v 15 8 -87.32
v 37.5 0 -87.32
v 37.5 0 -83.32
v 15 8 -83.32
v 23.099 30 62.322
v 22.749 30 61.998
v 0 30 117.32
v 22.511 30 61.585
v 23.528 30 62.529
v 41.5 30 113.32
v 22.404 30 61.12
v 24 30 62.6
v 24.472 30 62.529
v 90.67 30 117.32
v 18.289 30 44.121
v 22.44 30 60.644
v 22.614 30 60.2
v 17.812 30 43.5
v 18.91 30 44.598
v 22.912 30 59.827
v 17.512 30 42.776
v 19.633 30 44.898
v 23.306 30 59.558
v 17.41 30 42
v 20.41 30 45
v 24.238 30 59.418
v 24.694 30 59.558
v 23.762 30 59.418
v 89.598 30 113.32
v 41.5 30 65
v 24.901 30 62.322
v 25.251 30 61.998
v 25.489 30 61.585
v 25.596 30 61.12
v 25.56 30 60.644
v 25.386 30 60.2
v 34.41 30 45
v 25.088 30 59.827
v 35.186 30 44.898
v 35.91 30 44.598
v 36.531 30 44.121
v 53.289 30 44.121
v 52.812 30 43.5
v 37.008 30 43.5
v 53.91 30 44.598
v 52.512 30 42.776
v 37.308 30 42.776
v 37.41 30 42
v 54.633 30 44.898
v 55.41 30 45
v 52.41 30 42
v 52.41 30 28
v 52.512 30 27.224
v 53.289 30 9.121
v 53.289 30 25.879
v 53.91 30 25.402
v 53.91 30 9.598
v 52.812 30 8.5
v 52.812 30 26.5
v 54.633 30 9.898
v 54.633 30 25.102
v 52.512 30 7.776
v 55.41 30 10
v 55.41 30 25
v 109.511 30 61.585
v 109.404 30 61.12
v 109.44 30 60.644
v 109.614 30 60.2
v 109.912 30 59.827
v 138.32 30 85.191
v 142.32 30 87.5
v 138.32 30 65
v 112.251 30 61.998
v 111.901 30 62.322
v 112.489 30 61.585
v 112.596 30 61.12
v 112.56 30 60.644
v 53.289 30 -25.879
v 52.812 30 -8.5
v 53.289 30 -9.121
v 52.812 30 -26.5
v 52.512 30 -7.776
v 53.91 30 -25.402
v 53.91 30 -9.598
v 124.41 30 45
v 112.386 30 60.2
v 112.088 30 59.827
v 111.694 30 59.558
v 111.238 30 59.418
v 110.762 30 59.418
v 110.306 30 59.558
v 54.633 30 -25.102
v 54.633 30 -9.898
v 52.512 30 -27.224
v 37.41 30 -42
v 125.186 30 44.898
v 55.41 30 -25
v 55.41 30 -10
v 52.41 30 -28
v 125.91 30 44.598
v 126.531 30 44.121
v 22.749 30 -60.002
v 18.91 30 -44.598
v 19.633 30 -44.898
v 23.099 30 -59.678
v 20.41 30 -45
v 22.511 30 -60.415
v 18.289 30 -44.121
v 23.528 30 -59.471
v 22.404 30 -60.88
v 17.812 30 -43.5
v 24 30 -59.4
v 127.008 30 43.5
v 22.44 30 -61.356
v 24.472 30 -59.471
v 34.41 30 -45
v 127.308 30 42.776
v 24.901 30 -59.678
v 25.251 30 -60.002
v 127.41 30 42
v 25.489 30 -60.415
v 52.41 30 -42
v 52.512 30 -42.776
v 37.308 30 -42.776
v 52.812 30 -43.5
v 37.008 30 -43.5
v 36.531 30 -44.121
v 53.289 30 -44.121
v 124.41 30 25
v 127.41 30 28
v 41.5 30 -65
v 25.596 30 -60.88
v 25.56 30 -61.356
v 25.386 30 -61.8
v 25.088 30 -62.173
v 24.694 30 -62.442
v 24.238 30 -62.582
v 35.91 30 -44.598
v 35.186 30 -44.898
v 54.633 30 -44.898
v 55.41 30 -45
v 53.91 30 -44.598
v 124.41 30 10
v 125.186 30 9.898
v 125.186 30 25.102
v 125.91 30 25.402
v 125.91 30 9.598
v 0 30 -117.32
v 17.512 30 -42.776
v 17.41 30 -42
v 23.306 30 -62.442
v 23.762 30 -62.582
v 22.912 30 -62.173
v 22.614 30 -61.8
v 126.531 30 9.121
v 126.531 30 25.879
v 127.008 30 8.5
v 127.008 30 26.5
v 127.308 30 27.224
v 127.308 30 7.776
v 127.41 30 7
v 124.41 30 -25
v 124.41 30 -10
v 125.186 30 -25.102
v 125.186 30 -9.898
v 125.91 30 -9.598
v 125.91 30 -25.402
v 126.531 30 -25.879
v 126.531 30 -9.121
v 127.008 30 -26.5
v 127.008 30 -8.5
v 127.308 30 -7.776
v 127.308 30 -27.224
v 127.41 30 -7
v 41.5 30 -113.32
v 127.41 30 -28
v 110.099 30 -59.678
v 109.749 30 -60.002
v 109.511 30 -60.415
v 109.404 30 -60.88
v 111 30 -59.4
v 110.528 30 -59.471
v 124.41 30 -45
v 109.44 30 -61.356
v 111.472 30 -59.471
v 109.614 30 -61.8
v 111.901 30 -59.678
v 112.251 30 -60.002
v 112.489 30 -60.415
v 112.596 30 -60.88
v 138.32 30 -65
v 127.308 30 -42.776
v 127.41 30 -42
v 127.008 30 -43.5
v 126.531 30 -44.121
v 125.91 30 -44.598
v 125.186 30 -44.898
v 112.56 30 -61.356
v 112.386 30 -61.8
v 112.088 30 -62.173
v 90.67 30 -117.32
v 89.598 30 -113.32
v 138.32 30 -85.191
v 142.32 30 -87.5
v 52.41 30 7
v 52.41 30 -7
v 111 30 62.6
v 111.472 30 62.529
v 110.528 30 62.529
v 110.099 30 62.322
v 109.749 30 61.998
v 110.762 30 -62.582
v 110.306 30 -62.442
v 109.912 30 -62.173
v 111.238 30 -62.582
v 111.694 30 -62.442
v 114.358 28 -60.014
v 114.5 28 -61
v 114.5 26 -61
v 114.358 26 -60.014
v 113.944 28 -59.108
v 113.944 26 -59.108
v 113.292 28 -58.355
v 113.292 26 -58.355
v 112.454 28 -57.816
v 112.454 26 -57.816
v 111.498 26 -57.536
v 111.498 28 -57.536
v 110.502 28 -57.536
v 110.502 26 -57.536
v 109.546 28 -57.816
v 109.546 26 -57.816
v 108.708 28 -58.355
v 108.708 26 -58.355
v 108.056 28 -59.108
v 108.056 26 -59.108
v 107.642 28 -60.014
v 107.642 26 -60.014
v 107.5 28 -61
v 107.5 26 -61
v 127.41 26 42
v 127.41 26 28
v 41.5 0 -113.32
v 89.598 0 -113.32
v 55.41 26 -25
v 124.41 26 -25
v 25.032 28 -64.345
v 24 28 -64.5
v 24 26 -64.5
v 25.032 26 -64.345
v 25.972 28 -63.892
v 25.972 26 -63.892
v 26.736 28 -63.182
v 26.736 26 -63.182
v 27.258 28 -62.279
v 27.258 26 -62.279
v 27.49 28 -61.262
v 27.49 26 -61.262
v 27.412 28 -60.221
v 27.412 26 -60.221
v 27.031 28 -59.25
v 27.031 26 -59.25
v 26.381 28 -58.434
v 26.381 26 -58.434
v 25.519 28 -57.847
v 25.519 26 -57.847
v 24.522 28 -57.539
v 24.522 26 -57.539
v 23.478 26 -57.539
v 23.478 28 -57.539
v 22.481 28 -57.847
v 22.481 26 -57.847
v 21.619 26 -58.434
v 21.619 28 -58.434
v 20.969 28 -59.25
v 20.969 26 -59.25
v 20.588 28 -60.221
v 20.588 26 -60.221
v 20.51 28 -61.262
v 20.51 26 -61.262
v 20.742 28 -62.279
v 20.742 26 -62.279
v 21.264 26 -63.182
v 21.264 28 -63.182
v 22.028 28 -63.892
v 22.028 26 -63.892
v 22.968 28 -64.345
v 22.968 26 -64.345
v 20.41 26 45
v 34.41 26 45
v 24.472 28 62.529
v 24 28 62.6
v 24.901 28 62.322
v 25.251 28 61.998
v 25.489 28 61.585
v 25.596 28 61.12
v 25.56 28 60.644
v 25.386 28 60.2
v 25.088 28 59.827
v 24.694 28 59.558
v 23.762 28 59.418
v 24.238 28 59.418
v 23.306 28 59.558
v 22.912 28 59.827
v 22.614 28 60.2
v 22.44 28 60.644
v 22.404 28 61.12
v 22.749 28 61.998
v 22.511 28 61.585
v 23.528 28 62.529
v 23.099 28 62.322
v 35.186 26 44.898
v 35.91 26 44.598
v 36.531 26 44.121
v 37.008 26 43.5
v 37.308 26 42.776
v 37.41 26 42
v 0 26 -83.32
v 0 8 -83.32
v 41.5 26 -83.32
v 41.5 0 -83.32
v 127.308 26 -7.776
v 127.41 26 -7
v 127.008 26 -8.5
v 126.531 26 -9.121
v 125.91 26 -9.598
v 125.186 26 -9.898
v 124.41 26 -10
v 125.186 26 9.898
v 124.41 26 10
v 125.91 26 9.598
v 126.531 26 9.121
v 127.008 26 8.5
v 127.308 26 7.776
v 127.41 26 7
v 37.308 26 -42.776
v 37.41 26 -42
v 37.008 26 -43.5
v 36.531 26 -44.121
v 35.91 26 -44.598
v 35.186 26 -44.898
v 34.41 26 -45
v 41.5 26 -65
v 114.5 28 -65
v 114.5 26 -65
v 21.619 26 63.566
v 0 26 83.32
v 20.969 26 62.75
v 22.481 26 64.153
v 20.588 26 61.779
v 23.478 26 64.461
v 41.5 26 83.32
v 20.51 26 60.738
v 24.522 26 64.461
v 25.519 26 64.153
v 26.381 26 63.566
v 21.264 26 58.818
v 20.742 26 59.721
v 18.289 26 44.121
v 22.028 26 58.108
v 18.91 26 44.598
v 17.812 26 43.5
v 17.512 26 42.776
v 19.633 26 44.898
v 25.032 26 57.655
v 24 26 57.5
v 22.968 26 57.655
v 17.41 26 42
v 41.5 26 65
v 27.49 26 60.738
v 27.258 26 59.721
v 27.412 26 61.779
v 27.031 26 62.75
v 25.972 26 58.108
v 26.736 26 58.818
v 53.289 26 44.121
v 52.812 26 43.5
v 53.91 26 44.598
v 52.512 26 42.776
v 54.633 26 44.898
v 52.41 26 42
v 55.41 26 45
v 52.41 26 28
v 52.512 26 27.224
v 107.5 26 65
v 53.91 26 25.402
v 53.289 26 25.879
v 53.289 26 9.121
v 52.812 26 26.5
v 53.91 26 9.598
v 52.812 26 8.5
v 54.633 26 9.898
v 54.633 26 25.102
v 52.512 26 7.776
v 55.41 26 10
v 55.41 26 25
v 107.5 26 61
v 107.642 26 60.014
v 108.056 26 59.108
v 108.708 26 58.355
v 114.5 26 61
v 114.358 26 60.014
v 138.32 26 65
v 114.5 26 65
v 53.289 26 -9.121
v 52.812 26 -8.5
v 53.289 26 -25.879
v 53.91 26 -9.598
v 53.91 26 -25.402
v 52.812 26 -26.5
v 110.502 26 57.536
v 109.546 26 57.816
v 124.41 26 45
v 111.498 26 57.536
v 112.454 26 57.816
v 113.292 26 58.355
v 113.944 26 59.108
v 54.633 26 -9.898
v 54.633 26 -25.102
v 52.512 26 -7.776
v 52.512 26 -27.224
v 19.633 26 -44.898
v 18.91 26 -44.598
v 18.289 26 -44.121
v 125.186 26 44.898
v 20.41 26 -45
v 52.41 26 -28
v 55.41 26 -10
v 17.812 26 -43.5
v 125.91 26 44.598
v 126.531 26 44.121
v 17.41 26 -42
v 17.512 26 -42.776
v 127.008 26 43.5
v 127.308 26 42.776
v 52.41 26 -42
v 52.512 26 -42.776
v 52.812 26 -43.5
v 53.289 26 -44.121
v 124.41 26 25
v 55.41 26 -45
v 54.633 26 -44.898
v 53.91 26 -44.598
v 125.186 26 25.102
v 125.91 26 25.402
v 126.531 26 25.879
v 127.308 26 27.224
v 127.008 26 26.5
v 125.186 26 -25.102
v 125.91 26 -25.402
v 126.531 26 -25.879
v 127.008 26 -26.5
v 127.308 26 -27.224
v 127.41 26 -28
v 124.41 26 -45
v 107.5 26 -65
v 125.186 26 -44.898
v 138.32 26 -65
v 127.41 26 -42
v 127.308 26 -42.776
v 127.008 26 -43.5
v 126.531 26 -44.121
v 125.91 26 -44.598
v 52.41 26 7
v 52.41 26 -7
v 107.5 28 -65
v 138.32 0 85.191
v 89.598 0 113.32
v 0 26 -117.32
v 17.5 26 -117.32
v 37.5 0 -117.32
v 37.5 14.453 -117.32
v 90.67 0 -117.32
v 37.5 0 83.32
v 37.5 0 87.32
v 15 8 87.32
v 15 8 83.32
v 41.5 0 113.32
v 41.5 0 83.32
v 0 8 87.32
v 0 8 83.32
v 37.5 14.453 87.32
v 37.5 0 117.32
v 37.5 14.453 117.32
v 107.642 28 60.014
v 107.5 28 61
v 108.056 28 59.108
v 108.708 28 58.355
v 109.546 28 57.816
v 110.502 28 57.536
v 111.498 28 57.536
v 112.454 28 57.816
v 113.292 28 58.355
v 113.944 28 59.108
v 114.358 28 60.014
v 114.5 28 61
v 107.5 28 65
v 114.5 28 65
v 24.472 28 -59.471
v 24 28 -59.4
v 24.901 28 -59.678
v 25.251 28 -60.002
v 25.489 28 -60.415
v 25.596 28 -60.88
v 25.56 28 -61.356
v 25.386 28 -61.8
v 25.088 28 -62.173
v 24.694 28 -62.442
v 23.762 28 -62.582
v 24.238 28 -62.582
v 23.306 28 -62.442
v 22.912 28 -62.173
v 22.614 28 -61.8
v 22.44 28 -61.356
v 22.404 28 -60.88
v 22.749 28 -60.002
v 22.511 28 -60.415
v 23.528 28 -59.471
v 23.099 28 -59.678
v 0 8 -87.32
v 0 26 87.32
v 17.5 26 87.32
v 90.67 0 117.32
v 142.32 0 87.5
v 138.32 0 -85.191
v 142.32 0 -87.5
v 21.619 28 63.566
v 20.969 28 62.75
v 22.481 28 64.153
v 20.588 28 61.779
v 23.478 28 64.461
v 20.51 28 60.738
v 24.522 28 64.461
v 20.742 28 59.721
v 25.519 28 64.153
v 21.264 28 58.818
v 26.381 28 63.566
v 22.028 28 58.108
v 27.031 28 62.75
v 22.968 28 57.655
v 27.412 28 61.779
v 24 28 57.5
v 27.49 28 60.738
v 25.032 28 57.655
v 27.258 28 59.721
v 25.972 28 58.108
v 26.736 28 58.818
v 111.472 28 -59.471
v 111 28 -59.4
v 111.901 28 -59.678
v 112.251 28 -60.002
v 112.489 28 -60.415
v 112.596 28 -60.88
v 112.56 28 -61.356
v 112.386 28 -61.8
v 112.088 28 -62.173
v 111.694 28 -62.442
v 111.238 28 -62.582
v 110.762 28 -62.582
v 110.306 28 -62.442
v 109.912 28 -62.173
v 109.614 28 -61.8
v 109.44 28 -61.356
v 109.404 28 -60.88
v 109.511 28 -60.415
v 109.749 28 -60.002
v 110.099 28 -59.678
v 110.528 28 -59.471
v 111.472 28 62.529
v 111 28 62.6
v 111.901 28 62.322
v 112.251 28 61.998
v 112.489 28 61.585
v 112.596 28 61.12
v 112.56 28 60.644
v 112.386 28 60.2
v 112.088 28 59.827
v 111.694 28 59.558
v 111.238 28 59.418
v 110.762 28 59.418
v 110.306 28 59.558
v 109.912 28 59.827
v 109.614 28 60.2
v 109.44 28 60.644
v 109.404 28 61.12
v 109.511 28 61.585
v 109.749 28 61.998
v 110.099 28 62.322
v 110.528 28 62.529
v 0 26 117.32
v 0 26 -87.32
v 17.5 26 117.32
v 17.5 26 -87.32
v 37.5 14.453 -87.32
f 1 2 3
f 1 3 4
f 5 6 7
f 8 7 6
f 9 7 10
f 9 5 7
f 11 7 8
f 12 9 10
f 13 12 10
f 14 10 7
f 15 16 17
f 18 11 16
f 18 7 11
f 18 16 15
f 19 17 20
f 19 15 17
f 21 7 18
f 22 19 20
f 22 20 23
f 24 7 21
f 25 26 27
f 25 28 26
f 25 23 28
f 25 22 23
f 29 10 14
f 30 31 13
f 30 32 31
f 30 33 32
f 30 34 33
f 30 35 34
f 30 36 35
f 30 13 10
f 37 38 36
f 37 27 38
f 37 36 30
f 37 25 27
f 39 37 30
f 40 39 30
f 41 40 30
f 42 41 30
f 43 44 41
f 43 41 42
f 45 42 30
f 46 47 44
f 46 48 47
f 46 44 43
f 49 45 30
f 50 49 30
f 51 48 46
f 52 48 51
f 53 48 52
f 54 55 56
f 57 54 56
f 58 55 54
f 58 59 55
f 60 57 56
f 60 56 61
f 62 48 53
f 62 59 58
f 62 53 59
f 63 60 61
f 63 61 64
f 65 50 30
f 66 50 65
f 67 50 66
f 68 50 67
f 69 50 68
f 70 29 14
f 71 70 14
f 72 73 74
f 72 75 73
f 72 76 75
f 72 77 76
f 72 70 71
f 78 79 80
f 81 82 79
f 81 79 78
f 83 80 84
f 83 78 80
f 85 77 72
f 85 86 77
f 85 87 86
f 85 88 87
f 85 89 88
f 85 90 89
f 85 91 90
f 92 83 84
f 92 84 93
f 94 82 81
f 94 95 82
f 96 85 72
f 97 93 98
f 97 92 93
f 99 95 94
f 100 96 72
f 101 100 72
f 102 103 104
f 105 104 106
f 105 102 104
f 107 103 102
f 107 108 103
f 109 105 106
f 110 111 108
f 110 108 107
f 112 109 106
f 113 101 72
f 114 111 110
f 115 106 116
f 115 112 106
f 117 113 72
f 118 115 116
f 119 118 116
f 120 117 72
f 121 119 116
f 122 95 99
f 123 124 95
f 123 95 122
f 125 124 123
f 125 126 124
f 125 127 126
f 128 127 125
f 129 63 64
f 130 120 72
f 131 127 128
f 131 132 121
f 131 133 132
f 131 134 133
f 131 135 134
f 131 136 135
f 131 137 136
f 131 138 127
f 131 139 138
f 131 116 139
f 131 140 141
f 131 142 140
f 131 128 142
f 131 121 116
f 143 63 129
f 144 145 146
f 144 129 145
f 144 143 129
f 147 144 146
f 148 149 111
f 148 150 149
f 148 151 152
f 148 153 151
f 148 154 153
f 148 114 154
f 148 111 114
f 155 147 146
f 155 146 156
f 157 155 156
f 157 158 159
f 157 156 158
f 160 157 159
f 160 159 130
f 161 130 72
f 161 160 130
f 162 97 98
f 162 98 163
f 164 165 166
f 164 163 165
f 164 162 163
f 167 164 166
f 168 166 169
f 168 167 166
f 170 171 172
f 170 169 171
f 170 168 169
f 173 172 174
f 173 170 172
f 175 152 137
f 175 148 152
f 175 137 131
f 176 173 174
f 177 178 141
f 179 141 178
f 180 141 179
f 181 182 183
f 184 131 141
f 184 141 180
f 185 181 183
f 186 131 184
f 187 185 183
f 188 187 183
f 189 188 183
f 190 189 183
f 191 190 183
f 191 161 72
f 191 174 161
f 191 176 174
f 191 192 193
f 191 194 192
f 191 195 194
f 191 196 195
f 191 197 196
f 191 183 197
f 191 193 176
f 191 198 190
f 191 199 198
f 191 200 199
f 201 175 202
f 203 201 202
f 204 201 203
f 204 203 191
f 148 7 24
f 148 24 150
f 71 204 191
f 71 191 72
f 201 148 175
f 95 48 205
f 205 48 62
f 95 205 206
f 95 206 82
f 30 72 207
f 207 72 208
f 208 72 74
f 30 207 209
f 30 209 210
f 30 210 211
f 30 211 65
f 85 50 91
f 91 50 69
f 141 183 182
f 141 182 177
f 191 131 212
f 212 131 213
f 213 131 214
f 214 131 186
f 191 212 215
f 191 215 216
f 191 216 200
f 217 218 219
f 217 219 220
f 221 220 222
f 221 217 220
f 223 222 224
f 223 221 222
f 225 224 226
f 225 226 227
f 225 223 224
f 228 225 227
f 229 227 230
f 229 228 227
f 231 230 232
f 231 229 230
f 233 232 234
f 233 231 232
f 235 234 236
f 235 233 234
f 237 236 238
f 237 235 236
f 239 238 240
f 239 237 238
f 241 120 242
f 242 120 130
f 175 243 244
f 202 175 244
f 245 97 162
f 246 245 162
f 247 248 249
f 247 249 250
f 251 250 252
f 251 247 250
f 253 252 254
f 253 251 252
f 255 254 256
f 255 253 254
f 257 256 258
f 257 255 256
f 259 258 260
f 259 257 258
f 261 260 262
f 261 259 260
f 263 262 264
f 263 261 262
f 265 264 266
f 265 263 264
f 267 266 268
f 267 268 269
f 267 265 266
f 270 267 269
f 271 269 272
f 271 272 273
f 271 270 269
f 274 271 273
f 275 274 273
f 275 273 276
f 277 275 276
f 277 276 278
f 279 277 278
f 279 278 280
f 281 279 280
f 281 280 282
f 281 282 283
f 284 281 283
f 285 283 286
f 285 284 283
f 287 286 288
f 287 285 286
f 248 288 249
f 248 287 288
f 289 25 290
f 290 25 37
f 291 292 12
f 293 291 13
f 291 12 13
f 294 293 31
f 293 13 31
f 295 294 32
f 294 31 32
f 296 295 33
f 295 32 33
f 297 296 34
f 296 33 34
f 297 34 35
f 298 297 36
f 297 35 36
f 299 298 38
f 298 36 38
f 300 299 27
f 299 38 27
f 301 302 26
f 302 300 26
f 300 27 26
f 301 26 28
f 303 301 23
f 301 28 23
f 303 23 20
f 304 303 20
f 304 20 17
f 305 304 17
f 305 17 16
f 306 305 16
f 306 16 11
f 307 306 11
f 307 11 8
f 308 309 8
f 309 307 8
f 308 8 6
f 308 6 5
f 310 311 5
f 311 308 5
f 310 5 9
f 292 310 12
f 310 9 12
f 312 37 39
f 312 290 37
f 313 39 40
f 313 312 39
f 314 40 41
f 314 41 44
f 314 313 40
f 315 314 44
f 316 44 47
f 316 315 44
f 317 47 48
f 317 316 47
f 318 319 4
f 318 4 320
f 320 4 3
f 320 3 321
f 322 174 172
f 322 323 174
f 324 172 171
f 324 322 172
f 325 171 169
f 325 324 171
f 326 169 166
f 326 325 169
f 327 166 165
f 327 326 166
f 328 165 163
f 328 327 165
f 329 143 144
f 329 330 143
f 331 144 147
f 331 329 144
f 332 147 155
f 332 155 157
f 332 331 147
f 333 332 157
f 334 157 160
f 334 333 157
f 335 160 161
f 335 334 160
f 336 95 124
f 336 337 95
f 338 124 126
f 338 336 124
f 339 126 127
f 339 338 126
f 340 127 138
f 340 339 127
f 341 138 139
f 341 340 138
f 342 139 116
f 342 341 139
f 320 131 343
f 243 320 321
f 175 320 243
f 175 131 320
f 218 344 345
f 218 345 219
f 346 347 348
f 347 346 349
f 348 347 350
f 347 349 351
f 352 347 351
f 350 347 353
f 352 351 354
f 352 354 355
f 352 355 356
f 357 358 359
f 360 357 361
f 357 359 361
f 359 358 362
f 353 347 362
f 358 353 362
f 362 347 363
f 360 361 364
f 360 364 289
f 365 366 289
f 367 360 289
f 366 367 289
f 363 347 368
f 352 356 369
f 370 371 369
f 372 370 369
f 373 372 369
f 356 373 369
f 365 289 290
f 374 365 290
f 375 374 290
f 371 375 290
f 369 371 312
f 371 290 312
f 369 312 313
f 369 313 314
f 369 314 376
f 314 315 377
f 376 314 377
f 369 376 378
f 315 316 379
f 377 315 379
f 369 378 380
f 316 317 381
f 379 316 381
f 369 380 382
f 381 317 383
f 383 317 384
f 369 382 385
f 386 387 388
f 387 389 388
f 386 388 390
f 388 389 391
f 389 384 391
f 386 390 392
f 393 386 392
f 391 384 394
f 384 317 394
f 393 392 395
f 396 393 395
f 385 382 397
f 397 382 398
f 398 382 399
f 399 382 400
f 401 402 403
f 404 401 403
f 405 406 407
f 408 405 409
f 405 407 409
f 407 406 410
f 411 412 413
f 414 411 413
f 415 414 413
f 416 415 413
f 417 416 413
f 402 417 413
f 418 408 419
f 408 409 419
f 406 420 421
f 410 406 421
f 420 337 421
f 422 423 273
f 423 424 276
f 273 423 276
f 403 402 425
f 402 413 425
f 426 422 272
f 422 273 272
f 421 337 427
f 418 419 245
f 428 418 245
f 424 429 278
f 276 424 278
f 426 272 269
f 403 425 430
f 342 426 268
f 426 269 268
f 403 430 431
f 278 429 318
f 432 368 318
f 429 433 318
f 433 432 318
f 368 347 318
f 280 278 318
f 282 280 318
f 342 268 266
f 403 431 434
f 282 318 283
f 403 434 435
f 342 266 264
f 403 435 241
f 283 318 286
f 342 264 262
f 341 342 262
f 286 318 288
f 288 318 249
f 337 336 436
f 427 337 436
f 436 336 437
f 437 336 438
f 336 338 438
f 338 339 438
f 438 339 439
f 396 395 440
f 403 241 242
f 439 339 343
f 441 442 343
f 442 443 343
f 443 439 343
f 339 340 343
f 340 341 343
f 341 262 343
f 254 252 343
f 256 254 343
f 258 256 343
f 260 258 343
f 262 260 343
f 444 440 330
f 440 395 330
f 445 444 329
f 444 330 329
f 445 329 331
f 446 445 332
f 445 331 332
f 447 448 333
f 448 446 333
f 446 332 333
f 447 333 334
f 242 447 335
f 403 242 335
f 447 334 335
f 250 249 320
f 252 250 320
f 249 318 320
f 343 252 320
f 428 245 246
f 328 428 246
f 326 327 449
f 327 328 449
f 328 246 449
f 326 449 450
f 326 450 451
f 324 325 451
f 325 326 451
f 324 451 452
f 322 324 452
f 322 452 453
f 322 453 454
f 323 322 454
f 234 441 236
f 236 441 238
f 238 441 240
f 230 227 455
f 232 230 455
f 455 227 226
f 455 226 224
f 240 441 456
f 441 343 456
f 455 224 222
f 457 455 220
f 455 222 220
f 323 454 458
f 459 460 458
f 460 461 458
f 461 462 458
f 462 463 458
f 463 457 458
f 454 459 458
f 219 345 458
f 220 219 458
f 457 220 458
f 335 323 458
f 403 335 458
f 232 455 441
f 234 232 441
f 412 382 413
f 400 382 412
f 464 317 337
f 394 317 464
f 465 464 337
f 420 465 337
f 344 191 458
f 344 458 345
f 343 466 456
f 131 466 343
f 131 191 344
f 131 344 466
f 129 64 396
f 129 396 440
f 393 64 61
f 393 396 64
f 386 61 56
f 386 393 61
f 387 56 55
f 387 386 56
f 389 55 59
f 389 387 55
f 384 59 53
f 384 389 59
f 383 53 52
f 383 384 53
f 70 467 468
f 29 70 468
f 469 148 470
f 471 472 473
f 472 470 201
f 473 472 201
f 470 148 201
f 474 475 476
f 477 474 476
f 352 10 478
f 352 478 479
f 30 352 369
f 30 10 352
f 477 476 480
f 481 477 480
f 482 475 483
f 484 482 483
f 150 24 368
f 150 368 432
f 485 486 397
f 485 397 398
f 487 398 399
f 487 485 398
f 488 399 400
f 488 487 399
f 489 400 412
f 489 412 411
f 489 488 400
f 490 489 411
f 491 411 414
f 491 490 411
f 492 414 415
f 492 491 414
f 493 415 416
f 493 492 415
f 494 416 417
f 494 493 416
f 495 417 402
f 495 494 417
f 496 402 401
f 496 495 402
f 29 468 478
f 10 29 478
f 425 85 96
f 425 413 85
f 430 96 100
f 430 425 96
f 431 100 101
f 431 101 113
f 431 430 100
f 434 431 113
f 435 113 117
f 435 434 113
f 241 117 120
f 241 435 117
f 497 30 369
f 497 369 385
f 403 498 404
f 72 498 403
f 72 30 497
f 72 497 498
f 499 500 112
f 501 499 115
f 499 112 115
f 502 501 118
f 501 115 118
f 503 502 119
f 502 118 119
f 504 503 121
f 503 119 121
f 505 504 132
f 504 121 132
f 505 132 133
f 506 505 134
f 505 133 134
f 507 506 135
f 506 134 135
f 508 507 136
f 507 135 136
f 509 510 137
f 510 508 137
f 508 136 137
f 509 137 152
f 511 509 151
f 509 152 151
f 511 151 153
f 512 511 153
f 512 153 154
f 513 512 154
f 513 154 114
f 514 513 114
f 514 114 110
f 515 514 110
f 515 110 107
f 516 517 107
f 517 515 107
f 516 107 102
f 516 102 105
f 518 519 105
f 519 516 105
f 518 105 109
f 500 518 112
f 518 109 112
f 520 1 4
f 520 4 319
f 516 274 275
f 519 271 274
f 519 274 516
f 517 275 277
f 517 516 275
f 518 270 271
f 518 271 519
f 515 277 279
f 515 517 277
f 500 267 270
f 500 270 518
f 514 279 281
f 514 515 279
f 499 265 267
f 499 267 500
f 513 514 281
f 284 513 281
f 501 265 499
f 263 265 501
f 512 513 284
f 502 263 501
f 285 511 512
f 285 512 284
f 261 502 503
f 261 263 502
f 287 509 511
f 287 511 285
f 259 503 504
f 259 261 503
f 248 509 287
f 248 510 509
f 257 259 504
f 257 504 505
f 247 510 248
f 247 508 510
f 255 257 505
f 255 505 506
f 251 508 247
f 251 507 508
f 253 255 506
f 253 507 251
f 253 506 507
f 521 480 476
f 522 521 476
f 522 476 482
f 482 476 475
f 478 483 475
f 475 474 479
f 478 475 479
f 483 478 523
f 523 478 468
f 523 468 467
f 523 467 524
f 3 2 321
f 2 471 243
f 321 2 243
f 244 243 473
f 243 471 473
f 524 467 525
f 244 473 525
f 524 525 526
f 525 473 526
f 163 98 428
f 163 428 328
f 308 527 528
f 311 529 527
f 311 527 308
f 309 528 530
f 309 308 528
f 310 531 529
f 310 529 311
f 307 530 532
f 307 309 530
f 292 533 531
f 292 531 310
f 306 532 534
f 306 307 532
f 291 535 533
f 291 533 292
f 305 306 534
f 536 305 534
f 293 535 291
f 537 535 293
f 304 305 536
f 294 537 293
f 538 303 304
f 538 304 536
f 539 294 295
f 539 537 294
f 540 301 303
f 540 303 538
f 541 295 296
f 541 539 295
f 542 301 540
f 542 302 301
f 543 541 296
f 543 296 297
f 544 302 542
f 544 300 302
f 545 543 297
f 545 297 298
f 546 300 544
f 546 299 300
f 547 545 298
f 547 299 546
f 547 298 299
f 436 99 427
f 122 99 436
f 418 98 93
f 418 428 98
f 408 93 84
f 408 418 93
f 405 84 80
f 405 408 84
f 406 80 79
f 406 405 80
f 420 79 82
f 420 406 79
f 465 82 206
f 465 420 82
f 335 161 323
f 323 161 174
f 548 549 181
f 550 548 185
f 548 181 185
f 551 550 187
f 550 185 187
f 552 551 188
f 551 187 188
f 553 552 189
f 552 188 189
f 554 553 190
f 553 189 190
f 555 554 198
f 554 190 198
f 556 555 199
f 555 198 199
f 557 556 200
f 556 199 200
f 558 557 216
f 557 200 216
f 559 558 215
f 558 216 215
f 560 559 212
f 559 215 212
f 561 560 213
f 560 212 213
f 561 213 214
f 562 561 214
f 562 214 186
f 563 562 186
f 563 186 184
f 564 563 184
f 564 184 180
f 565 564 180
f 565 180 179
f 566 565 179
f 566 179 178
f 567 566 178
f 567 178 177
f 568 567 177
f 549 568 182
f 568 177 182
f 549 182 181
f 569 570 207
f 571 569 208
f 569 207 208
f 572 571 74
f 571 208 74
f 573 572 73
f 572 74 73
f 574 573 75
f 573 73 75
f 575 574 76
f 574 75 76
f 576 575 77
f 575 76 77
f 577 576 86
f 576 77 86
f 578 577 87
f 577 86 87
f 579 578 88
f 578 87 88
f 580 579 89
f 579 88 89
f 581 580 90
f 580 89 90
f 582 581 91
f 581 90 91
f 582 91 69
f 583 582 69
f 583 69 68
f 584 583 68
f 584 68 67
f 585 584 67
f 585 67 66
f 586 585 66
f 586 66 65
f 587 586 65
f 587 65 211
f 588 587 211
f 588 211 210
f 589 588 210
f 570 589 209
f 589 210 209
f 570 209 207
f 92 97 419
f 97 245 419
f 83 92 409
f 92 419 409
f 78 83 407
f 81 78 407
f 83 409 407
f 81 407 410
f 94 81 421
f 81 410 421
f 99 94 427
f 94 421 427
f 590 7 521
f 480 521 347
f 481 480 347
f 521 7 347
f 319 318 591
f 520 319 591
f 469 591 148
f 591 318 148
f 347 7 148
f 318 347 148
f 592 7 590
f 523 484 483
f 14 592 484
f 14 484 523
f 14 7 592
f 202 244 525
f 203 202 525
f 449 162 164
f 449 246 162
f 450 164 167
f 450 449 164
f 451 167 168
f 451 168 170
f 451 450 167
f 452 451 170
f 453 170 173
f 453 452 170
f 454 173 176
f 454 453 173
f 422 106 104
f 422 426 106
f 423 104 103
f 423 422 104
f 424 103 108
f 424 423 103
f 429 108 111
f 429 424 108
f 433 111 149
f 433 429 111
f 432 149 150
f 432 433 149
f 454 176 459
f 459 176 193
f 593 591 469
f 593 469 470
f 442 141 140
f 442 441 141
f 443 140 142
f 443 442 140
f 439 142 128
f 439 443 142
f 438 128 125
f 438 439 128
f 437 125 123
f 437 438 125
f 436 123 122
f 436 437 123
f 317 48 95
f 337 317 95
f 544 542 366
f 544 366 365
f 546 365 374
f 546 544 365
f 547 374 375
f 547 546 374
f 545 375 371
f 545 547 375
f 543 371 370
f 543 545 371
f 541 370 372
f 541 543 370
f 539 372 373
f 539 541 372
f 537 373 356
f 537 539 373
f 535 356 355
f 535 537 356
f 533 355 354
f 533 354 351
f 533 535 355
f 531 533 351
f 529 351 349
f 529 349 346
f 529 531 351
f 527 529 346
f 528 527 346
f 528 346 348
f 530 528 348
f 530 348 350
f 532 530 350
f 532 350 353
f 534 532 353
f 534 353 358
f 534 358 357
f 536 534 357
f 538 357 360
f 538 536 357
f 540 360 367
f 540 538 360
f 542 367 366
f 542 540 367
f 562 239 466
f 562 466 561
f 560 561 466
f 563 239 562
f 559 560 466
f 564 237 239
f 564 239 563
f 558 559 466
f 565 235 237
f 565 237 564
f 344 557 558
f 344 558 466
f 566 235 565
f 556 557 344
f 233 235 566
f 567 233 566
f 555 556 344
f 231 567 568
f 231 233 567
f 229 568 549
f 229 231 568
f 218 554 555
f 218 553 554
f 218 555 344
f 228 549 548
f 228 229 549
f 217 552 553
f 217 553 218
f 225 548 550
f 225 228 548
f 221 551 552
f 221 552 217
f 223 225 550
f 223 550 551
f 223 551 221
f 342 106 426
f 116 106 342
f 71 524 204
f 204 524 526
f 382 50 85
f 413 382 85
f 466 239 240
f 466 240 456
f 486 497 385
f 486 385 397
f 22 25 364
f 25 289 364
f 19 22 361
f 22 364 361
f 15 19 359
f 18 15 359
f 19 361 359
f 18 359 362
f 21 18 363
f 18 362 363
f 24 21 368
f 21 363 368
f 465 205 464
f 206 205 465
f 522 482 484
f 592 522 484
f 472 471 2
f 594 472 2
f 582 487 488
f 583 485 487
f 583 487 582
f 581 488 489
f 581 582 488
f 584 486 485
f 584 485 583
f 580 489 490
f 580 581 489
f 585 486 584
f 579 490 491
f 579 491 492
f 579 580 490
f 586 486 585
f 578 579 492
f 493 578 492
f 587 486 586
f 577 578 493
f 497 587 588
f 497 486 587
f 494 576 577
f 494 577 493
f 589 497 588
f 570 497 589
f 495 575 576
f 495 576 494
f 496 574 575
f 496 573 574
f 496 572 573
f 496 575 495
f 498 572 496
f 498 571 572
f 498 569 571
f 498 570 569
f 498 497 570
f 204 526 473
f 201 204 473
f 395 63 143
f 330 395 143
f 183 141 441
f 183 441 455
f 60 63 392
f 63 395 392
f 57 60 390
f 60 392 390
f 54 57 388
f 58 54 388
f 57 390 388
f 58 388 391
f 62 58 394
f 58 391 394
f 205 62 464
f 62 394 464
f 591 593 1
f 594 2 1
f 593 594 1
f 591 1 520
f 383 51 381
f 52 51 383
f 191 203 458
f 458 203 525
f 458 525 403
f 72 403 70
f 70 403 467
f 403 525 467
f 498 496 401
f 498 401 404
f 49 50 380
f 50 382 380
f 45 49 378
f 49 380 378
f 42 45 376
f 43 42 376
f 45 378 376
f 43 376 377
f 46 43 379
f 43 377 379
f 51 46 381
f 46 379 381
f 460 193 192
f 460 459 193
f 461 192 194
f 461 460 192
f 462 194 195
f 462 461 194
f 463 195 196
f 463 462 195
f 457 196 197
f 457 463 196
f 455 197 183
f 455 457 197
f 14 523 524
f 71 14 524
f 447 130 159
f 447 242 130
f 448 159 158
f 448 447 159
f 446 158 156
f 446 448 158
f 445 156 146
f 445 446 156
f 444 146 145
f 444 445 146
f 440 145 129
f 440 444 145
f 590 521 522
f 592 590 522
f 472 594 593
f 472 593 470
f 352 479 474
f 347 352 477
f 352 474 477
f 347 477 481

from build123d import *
from OCP.BRepFilletAPI import BRepFilletAPI_MakeChamfer

# Parameters (mm, degrees)
BOSS_EXTRUDE1_DEPTH = 30
CUT_EXTRUDE1_REACH  = 253.063
SKETCH10_W          = 41.5
SKETCH10_H          = 34
BOSS_EXTRUDE3_DEPTH = 4
CHAMFER4_SIZE       = 20
CHAMFER4_SIZE2      = 11.547005384
SKETCH11_W          = 20.75
SKETCH11_H          = 166.64
BOSS_EXTRUDE4_DEPTH = 4
SKETCH12_W          = 20.75
SKETCH12_H          = 18.32
BOSS_EXTRUDE5_DEPTH = 4
SKETCH13_W          = 75
SKETCH13_H          = 20
SKETCH13_W_2        = 20
SKETCH13_H_2        = 90
CUT_EXTRUDE2_DEPTH  = 4
FILLET1_R           = 3
CUT_EXTRUDE3_REACH  = 188.866
SKETCH15_R          = 1.6
CUT_EXTRUDE4_START  = -2
SKETCH16_R          = 3.5
SKETCH16_R_2        = 1.6
CUT_EXTRUDE4_DEPTH  = 2


with BuildPart() as part:
    # Sketch6 → Boss-Extrude1 (new body)
    with BuildSketch(Plane(origin=(0, 0, 0), x_dir=(1, 0, 0), z_dir=(0, 1, 0))):
        Polygon((0, -87.32), (37.5, -87.32), (37.5, -117.32), (90.67, -117.32), (142.319755082, -87.5), (142.319755082, 87.5), (90.67, 117.32), (37.5, 117.32), (37.5, 87.32), (0, 87.32), (0, 83.32), (41.5, 83.32), (41.5, 113.32), (89.59820323, 113.32), (138.319755082, 85.190598923), (138.319755082, -85.190598923), (89.59820323, -113.32), (41.5, -113.32), (41.5, -83.32), (0, -83.32), align=None)
    extrude(amount=BOSS_EXTRUDE1_DEPTH)

    # Sketch9 → Cut-Extrude1 (cut, up to next)
    with BuildSketch(Plane.XY.offset(87.32), mode=Mode.PRIVATE) as cut_extrude1_sk1:
        Polygon((37.5, 0), (15, 8), (0, 8), (0, 0), align=None)
    cut_extrude1_tool1 = extrude(cut_extrude1_sk1.sketch, amount=-CUT_EXTRUDE1_REACH, mode=Mode.PRIVATE) & part.part
    cut_extrude1 = cut_extrude1_tool1.solids().sort_by_distance((13.928571, 3.428571, 87.32))[0]
    add(cut_extrude1, mode=Mode.SUBTRACT)

    # Sketch10 → Boss-Extrude3 (add)
    with BuildSketch(Plane(origin=(0, 30, 0), x_dir=(1, 0, 0), z_dir=(0, 1, 0))):
        with Locations((20.75, -100.32)):
            Rectangle(SKETCH10_W, SKETCH10_H)
    boss_extrude3 = extrude(amount=-BOSS_EXTRUDE3_DEPTH)

    # Mirror1: Cut-Extrude1, Boss-Extrude3 across plane
    add(cut_extrude1.mirror(Plane.XY), mode=Mode.SUBTRACT)
    add(boss_extrude3.mirror(Plane.XY))

    # Chamfer4: one chamfer whose edges measure the first distance from different faces: ONE call of the kernel's chamfer builder (chamfer() names one face for all edges)
    chamfer4_edges_1 = [part.edges().sort_by_distance(p)[0] for p in [
        (37.5, 26, -102.32),
    ]]
    chamfer4_side_1 = [part.faces().sort_by_distance(p)[0] for p in [
        (18.75, 26, -102.32),
    ]]
    chamfer4_edges_2 = [part.edges().sort_by_distance(p)[0] for p in [
        (37.5, 26, 102.32),
    ]]
    chamfer4_side_2 = [part.faces().sort_by_distance(p)[0] for p in [
        (18.75, 26, 102.32),
    ]]
    chamfer4 = BRepFilletAPI_MakeChamfer(part.part.solid().wrapped)
    for e in chamfer4_edges_1:
        chamfer4.Add(CHAMFER4_SIZE, CHAMFER4_SIZE2, e.wrapped, chamfer4_side_1[0].wrapped)  # the first distance lies on this face
    for e in chamfer4_edges_2:
        chamfer4.Add(CHAMFER4_SIZE, CHAMFER4_SIZE2, e.wrapped, chamfer4_side_2[0].wrapped)  # the first distance lies on this face
    add(Compound.cast(chamfer4.Shape()), mode=Mode.REPLACE)

    # Sketch11 → Boss-Extrude4 (add)
    with BuildSketch(Plane(origin=(0, 30, 0), x_dir=(1, 0, 0), z_dir=(0, 1, 0))):
        with Locations((10.375, 0)):
            Rectangle(SKETCH11_W, SKETCH11_H)
    extrude(amount=-BOSS_EXTRUDE4_DEPTH)

    # Sketch12 → Boss-Extrude5 (add)
    with BuildSketch(Plane(origin=(0, 30, 0), x_dir=(1, 0, 0), z_dir=(0, 1, 0))):
        Polygon((41.5, 65), (20.75, 65), (20.75, -65), (41.5, -65), (138.319755082, -65), (138.319755082, 65), align=None)
        with Locations((31.125, -74.16)):
            Rectangle(SKETCH12_W, SKETCH12_H)
        with Locations((31.125, 74.16)):
            Rectangle(SKETCH12_W, SKETCH12_H)
    extrude(amount=-BOSS_EXTRUDE5_DEPTH)

    # Sketch13 → Cut-Extrude2 (cut)
    with BuildSketch(Plane(origin=(0, 30, 0), x_dir=(1, 0, 0), z_dir=(0, 1, 0))):
        with Locations((89.909877541, 35)):
            Rectangle(SKETCH13_W, SKETCH13_H)
        with Locations((89.909877541, 0)):
            Rectangle(SKETCH13_W, SKETCH13_H)
        with Locations((89.909877541, -35)):
            Rectangle(SKETCH13_W, SKETCH13_H)
        with Locations((27.409877541, 0)):
            Rectangle(SKETCH13_W_2, SKETCH13_H_2)
    extrude(amount=-CUT_EXTRUDE2_DEPTH, mode=Mode.SUBTRACT)

    # Fillet1
    fillet1_edges = [part.edges().sort_by_distance(p)[0] for p in [
        (37.409877541, 28, -45),
        (37.409877541, 28, 45),
        (17.409877541, 28, 45),
        (17.409877541, 28, -45),
        (52.409877541, 28, 45),
        (52.409877541, 28, 25),
        (127.409877541, 28, 25),
        (127.409877541, 28, 45),
        (52.409877541, 28, 10),
        (52.409877541, 28, -10),
        (127.409877541, 28, -10),
        (127.409877541, 28, 10),
        (52.409877541, 28, -25),
        (52.409877541, 28, -45),
        (127.409877541, 28, -45),
        (127.409877541, 28, -25),
    ]]
    fillet(fillet1_edges, radius=FILLET1_R)

    # Sketch15 → Cut-Extrude3 (cut, up to next)
    with BuildSketch(Plane(origin=(0, 30, 0), x_dir=(1, 0, 0), z_dir=(0, 1, 0)), mode=Mode.PRIVATE) as cut_extrude3_sk1:
        with Locations(Location((111, 61, 0), (0, 0, 270))):
            Circle(SKETCH15_R)
    cut_extrude3_tool1 = extrude(cut_extrude3_sk1.sketch, amount=-CUT_EXTRUDE3_REACH, mode=Mode.PRIVATE) & part.part
    # Sketch15 → Cut-Extrude3 (cut, up to next)
    with BuildSketch(Plane(origin=(0, 30, 0), x_dir=(1, 0, 0), z_dir=(0, 1, 0)), mode=Mode.PRIVATE) as cut_extrude3_sk2:
        with Locations(Location((111, -61, 0), (0, 0, 270))):
            Circle(SKETCH15_R)
    cut_extrude3_tool2 = extrude(cut_extrude3_sk2.sketch, amount=-CUT_EXTRUDE3_REACH, mode=Mode.PRIVATE) & part.part
    # Sketch15 → Cut-Extrude3 (cut, up to next)
    with BuildSketch(Plane(origin=(0, 30, 0), x_dir=(1, 0, 0), z_dir=(0, 1, 0)), mode=Mode.PRIVATE) as cut_extrude3_sk3:
        with Locations(Location((24, -61, 0), (0, 0, 270))):
            Circle(SKETCH15_R)
    cut_extrude3_tool3 = extrude(cut_extrude3_sk3.sketch, amount=-CUT_EXTRUDE3_REACH, mode=Mode.PRIVATE) & part.part
    # Sketch15 → Cut-Extrude3 (cut, up to next)
    with BuildSketch(Plane(origin=(0, 30, 0), x_dir=(1, 0, 0), z_dir=(0, 1, 0)), mode=Mode.PRIVATE) as cut_extrude3_sk4:
        with Locations(Location((24, 61, 0), (0, 0, 270))):
            Circle(SKETCH15_R)
    cut_extrude3_tool4 = extrude(cut_extrude3_sk4.sketch, amount=-CUT_EXTRUDE3_REACH, mode=Mode.PRIVATE) & part.part
    add(cut_extrude3_tool1.solids().sort_by_distance((111, 30, -61))[0], mode=Mode.SUBTRACT)
    add(cut_extrude3_tool2.solids().sort_by_distance((111, 30, 61))[0], mode=Mode.SUBTRACT)
    add(cut_extrude3_tool3.solids().sort_by_distance((24, 30, 61))[0], mode=Mode.SUBTRACT)
    add(cut_extrude3_tool4.solids().sort_by_distance((24, 30, -61))[0], mode=Mode.SUBTRACT)

    # Sketch16 → Cut-Extrude4 (cut)
    # profile 1 of 12: a face of its own
    with BuildSketch(Plane.XZ.offset(-26).offset(CUT_EXTRUDE4_START)):
        with Locations(Location((24, 61, 0), (0, 0, 270))):
            Circle(SKETCH16_R)
        with Locations(Location((24, 61, 0), (0, 0, 90))):
            Circle(SKETCH16_R_2, mode=Mode.SUBTRACT)
    # profile 2 of 12: a face of its own
    with BuildSketch(Plane.XZ.offset(-26).offset(CUT_EXTRUDE4_START)):
        with BuildLine():
            ThreePointArc((109.4, 61), (111, 62.6), (112.6, 61))
            Line((112.6, 61), (114.5, 61))
            ThreePointArc((114.5, 61), (111, 64.5), (107.5, 61))
            Line((107.5, 61), (109.4, 61))
        make_face()
    # profile 3 of 12: a face of its own
    with BuildSketch(Plane.XZ.offset(-26).offset(CUT_EXTRUDE4_START)):
        with BuildLine():
            Line((114.5, 61), (112.6, 61))
            ThreePointArc((112.6, 61), (111, 59.4), (109.4, 61))
            Line((109.4, 61), (107.5, 61))
            ThreePointArc((107.5, 61), (111, 57.5), (114.5, 61))
        make_face()
    # profile 4 of 12: a face of its own
    with BuildSketch(Plane.XZ.offset(-26).offset(CUT_EXTRUDE4_START)):
        with BuildLine():
            ThreePointArc((109.4, 61), (111, 62.6), (112.6, 61))
            Line((112.6, 61), (114.5, 61))
            ThreePointArc((114.5, 61), (111, 64.5), (107.5, 61))
            Line((107.5, 61), (109.4, 61))
        make_face()
    # profile 5 of 12: a face of its own
    with BuildSketch(Plane.XZ.offset(-26).offset(CUT_EXTRUDE4_START)):
        with BuildLine():
            Line((114.5, 61), (112.6, 61))
            ThreePointArc((112.6, 61), (111, 59.4), (109.4, 61))
            Line((109.4, 61), (107.5, 61))
            ThreePointArc((107.5, 61), (111, 57.5), (114.5, 61))
        make_face()
    # profile 6 of 12: a face of its own
    with BuildSketch(Plane.XZ.offset(-26).offset(CUT_EXTRUDE4_START)):
        with BuildLine():
            ThreePointArc((107.5, 61), (111, 64.5), (114.5, 61))
            Line((114.5, 61), (114.5, 65))
            Line((114.5, 65), (107.5, 65))
            Line((107.5, 65), (107.5, 61))
        make_face()
    # profile 7 of 12: a face of its own
    with BuildSketch(Plane.XZ.offset(-26).offset(CUT_EXTRUDE4_START)):
        with BuildLine():
            Line((114.5, -65), (114.5, -61))
            ThreePointArc((114.5, -61), (111, -64.5), (107.5, -61))
            Line((107.5, -61), (107.5, -65))
            Line((107.5, -65), (114.5, -65))
        make_face()
    # profile 8 of 12: a face of its own
    with BuildSketch(Plane.XZ.offset(-26).offset(CUT_EXTRUDE4_START)):
        with BuildLine():
            ThreePointArc((109.4, -61), (111, -59.4), (112.6, -61))
            Line((112.6, -61), (114.5, -61))
            ThreePointArc((114.5, -61), (111, -57.5), (107.5, -61))
            Line((107.5, -61), (109.4, -61))
        make_face()
    # profile 9 of 12: a face of its own
    with BuildSketch(Plane.XZ.offset(-26).offset(CUT_EXTRUDE4_START)):
        with BuildLine():
            Line((114.5, -61), (112.6, -61))
            ThreePointArc((112.6, -61), (111, -62.6), (109.4, -61))
            Line((109.4, -61), (107.5, -61))
            ThreePointArc((107.5, -61), (111, -64.5), (114.5, -61))
        make_face()
    # profile 10 of 12: a face of its own
    with BuildSketch(Plane.XZ.offset(-26).offset(CUT_EXTRUDE4_START)):
        with BuildLine():
            ThreePointArc((109.4, -61), (111, -59.4), (112.6, -61))
            Line((112.6, -61), (114.5, -61))
            ThreePointArc((114.5, -61), (111, -57.5), (107.5, -61))
            Line((107.5, -61), (109.4, -61))
        make_face()
    # profile 11 of 12: a face of its own
    with BuildSketch(Plane.XZ.offset(-26).offset(CUT_EXTRUDE4_START)):
        with BuildLine():
            Line((114.5, -61), (112.6, -61))
            ThreePointArc((112.6, -61), (111, -62.6), (109.4, -61))
            Line((109.4, -61), (107.5, -61))
            ThreePointArc((107.5, -61), (111, -64.5), (114.5, -61))
        make_face()
    # profile 12 of 12: a face of its own
    with BuildSketch(Plane.XZ.offset(-26).offset(CUT_EXTRUDE4_START)):
        with Locations(Location((24, -61, 0), (0, 0, 270))):
            Circle(SKETCH16_R)
        with Locations(Location((24, -61, 0), (0, 0, 90))):
            Circle(SKETCH16_R_2, mode=Mode.SUBTRACT)
    extrude(amount=CUT_EXTRUDE4_DEPTH, mode=Mode.SUBTRACT)


solid = part.part
